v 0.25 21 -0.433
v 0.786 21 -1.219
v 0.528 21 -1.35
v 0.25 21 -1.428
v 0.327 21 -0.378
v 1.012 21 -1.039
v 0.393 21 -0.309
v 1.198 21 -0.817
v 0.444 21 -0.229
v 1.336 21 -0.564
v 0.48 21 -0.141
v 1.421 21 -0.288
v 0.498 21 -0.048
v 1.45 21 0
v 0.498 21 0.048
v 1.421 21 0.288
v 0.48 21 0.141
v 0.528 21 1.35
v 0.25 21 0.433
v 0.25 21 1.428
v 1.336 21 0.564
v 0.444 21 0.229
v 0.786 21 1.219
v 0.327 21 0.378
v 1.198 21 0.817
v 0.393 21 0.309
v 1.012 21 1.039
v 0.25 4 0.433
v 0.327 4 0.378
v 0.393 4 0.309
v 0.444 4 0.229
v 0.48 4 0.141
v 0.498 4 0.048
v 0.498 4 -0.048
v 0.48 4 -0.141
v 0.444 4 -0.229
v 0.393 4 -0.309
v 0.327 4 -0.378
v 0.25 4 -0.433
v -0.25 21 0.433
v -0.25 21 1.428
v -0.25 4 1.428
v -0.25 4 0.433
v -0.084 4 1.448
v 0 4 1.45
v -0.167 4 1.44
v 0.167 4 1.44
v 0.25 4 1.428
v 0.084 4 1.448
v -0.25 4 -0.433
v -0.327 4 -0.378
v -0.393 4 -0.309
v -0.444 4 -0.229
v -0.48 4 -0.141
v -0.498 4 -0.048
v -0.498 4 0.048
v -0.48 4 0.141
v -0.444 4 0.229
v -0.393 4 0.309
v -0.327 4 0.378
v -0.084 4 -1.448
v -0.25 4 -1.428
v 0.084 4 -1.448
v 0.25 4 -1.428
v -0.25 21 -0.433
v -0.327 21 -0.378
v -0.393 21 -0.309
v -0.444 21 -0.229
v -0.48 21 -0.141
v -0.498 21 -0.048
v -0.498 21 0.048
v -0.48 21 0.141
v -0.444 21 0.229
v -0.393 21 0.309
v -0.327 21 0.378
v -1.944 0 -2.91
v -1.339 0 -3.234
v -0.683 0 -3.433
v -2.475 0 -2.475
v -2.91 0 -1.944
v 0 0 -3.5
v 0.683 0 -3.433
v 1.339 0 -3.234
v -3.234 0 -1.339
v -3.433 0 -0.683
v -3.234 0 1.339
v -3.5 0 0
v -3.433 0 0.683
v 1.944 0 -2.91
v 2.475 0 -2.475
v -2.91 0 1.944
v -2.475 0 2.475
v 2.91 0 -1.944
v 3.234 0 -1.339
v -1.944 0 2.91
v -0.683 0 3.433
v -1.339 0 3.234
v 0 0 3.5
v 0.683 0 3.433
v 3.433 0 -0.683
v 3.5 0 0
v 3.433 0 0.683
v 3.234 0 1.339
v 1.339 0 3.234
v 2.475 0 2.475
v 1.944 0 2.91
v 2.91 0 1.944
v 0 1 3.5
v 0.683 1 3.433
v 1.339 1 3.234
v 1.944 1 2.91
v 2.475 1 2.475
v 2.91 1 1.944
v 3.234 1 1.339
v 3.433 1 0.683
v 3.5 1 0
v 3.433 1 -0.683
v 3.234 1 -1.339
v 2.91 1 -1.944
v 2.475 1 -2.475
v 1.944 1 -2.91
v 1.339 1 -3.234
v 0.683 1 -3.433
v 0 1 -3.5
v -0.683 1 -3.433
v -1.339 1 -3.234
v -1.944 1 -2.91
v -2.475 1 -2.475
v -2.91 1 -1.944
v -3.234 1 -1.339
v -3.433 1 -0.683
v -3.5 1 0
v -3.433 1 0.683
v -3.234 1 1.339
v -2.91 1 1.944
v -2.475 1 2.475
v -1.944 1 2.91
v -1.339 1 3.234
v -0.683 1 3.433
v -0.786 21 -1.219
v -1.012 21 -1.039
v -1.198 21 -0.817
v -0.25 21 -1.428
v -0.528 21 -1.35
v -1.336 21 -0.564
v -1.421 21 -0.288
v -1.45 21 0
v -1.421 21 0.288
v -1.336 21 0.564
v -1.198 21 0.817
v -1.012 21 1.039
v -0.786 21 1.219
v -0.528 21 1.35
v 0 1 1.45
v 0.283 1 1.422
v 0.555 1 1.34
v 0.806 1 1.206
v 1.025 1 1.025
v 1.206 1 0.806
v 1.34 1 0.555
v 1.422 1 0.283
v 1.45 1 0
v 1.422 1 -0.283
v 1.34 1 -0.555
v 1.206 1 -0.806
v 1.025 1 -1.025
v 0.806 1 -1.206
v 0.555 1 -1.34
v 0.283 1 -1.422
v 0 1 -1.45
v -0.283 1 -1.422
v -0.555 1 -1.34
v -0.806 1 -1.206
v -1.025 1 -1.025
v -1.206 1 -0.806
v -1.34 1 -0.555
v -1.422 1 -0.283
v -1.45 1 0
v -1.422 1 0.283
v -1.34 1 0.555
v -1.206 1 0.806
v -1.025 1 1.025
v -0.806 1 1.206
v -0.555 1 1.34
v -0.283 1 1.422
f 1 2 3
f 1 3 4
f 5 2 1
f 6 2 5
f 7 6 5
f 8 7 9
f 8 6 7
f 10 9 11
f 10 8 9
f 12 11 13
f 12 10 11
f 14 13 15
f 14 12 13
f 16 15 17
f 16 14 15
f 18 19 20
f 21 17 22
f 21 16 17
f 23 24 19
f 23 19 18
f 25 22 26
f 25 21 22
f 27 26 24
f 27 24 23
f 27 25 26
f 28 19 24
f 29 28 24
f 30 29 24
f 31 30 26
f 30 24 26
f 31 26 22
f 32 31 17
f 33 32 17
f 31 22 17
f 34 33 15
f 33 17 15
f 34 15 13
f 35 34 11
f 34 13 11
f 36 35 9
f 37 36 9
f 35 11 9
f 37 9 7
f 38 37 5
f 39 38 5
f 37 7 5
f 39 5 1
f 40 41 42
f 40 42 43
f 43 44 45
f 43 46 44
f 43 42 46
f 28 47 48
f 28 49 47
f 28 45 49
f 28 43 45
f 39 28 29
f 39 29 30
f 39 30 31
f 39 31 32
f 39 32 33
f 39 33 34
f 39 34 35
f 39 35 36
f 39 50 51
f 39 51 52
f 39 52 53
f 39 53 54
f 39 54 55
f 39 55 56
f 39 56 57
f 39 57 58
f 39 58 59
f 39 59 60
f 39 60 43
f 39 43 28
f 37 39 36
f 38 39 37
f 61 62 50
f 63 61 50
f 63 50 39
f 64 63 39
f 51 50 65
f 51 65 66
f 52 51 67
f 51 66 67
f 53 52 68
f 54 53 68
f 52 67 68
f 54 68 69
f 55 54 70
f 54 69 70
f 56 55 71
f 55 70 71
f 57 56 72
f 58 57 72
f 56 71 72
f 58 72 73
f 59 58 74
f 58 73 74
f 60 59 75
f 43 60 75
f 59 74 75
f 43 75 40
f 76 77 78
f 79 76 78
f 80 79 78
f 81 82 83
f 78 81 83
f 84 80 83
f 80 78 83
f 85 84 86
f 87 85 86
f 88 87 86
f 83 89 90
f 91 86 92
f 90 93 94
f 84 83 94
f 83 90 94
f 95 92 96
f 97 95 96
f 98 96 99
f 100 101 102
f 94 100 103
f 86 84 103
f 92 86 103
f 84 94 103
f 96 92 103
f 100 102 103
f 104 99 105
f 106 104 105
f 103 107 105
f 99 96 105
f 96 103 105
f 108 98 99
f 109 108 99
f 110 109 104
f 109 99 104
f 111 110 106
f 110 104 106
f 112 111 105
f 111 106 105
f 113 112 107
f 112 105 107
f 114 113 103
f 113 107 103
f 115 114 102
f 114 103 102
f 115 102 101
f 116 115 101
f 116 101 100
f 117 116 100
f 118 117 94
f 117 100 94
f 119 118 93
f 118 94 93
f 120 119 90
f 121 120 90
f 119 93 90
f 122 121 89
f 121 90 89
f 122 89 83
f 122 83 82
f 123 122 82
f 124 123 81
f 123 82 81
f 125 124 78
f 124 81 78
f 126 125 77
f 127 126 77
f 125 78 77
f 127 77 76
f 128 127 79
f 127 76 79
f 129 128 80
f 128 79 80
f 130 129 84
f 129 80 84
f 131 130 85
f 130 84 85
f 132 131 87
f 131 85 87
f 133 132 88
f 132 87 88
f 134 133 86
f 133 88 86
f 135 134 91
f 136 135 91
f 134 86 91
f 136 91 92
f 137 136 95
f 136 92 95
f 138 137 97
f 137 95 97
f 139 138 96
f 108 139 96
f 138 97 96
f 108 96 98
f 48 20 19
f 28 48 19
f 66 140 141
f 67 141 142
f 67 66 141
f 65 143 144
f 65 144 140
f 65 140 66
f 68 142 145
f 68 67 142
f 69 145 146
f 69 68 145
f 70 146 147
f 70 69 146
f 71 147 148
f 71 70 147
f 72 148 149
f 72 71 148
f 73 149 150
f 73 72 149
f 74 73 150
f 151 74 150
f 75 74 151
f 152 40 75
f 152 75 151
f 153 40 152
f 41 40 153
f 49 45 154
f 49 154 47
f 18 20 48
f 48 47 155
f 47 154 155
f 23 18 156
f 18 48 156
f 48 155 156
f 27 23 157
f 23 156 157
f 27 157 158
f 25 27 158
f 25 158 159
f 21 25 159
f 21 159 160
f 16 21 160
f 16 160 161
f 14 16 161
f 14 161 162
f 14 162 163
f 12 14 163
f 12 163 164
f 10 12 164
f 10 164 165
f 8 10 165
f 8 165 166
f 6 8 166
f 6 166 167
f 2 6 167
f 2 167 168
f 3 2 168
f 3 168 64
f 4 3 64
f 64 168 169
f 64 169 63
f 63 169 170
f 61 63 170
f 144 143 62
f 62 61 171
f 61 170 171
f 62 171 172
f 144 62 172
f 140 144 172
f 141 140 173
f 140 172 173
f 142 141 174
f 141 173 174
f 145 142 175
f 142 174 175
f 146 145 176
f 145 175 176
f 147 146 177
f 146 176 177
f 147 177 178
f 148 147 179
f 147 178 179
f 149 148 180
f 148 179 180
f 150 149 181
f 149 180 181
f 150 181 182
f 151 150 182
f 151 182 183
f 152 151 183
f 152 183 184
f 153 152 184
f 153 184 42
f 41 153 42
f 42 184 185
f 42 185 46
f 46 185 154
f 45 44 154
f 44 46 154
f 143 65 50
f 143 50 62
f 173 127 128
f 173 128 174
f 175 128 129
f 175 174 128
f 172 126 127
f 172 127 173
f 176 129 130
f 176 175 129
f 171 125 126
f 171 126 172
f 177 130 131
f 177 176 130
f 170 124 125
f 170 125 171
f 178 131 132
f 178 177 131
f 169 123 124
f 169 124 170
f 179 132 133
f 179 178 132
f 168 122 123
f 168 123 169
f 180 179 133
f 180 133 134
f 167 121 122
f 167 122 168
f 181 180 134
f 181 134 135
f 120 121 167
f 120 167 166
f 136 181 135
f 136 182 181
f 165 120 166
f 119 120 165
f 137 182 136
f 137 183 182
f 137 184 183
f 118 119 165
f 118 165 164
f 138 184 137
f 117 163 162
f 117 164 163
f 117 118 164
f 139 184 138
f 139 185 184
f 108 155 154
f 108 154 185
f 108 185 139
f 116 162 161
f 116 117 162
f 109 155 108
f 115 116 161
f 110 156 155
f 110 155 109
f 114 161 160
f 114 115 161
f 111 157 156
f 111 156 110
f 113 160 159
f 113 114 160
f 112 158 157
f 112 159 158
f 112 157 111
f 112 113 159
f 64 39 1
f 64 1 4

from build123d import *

# Parameters (mm, degrees)
SKIZZE1_R                       = 3.5
AUFSATZ_LINEAR_AUSTRAGEN1_DEPTH = 1
SKIZZE2_R                       = 1.45
AUFSATZ_LINEAR_AUSTRAGEN2_DEPTH = 20
SKIZZE3_W                       = 0.5
SKIZZE3_H                       = 3
SCHNITT_LINEAR_AUSTRAGEN1_DEPTH = 17
SKIZZE4_R                       = 0.5
SCHNITT_LINEAR_AUSTRAGEN2_DEPTH = 17


with BuildPart() as part:
    # Skizze1 → Aufsatz-Linear austragen1 (new body)
    with BuildSketch(Plane(origin=(0, 0, 0), x_dir=(1, 0, 0), z_dir=(0, 1, 0))):
        with Locations(Location((0, 0, 0), (0, 0, 270))):
            Circle(SKIZZE1_R)
    extrude(amount=AUFSATZ_LINEAR_AUSTRAGEN1_DEPTH)

    # Skizze2 → Aufsatz-Linear austragen2 (add)
    with BuildSketch(Plane(origin=(0, 1, 0), x_dir=(1, 0, 0), z_dir=(0, 1, 0))):
        with Locations(Location((0, 0, 0), (0, 0, 270))):
            Circle(SKIZZE2_R)
    extrude(amount=AUFSATZ_LINEAR_AUSTRAGEN2_DEPTH)

    # Skizze3 → Schnitt-Linear austragen1 (cut)
    with BuildSketch(Plane(origin=(0, 21, 0), x_dir=(1, 0, 0), z_dir=(0, 1, 0))):
        Rectangle(SKIZZE3_W, SKIZZE3_H)
    extrude(amount=-SCHNITT_LINEAR_AUSTRAGEN1_DEPTH, mode=Mode.SUBTRACT)

    # Skizze4 → Schnitt-Linear austragen2 (cut)
    with BuildSketch(Plane(origin=(0, 21, 0), x_dir=(1, 0, 0), z_dir=(0, 1, 0))):
        Circle(SKIZZE4_R)
    extrude(amount=-SCHNITT_LINEAR_AUSTRAGEN2_DEPTH, mode=Mode.SUBTRACT)


solid = part.part
